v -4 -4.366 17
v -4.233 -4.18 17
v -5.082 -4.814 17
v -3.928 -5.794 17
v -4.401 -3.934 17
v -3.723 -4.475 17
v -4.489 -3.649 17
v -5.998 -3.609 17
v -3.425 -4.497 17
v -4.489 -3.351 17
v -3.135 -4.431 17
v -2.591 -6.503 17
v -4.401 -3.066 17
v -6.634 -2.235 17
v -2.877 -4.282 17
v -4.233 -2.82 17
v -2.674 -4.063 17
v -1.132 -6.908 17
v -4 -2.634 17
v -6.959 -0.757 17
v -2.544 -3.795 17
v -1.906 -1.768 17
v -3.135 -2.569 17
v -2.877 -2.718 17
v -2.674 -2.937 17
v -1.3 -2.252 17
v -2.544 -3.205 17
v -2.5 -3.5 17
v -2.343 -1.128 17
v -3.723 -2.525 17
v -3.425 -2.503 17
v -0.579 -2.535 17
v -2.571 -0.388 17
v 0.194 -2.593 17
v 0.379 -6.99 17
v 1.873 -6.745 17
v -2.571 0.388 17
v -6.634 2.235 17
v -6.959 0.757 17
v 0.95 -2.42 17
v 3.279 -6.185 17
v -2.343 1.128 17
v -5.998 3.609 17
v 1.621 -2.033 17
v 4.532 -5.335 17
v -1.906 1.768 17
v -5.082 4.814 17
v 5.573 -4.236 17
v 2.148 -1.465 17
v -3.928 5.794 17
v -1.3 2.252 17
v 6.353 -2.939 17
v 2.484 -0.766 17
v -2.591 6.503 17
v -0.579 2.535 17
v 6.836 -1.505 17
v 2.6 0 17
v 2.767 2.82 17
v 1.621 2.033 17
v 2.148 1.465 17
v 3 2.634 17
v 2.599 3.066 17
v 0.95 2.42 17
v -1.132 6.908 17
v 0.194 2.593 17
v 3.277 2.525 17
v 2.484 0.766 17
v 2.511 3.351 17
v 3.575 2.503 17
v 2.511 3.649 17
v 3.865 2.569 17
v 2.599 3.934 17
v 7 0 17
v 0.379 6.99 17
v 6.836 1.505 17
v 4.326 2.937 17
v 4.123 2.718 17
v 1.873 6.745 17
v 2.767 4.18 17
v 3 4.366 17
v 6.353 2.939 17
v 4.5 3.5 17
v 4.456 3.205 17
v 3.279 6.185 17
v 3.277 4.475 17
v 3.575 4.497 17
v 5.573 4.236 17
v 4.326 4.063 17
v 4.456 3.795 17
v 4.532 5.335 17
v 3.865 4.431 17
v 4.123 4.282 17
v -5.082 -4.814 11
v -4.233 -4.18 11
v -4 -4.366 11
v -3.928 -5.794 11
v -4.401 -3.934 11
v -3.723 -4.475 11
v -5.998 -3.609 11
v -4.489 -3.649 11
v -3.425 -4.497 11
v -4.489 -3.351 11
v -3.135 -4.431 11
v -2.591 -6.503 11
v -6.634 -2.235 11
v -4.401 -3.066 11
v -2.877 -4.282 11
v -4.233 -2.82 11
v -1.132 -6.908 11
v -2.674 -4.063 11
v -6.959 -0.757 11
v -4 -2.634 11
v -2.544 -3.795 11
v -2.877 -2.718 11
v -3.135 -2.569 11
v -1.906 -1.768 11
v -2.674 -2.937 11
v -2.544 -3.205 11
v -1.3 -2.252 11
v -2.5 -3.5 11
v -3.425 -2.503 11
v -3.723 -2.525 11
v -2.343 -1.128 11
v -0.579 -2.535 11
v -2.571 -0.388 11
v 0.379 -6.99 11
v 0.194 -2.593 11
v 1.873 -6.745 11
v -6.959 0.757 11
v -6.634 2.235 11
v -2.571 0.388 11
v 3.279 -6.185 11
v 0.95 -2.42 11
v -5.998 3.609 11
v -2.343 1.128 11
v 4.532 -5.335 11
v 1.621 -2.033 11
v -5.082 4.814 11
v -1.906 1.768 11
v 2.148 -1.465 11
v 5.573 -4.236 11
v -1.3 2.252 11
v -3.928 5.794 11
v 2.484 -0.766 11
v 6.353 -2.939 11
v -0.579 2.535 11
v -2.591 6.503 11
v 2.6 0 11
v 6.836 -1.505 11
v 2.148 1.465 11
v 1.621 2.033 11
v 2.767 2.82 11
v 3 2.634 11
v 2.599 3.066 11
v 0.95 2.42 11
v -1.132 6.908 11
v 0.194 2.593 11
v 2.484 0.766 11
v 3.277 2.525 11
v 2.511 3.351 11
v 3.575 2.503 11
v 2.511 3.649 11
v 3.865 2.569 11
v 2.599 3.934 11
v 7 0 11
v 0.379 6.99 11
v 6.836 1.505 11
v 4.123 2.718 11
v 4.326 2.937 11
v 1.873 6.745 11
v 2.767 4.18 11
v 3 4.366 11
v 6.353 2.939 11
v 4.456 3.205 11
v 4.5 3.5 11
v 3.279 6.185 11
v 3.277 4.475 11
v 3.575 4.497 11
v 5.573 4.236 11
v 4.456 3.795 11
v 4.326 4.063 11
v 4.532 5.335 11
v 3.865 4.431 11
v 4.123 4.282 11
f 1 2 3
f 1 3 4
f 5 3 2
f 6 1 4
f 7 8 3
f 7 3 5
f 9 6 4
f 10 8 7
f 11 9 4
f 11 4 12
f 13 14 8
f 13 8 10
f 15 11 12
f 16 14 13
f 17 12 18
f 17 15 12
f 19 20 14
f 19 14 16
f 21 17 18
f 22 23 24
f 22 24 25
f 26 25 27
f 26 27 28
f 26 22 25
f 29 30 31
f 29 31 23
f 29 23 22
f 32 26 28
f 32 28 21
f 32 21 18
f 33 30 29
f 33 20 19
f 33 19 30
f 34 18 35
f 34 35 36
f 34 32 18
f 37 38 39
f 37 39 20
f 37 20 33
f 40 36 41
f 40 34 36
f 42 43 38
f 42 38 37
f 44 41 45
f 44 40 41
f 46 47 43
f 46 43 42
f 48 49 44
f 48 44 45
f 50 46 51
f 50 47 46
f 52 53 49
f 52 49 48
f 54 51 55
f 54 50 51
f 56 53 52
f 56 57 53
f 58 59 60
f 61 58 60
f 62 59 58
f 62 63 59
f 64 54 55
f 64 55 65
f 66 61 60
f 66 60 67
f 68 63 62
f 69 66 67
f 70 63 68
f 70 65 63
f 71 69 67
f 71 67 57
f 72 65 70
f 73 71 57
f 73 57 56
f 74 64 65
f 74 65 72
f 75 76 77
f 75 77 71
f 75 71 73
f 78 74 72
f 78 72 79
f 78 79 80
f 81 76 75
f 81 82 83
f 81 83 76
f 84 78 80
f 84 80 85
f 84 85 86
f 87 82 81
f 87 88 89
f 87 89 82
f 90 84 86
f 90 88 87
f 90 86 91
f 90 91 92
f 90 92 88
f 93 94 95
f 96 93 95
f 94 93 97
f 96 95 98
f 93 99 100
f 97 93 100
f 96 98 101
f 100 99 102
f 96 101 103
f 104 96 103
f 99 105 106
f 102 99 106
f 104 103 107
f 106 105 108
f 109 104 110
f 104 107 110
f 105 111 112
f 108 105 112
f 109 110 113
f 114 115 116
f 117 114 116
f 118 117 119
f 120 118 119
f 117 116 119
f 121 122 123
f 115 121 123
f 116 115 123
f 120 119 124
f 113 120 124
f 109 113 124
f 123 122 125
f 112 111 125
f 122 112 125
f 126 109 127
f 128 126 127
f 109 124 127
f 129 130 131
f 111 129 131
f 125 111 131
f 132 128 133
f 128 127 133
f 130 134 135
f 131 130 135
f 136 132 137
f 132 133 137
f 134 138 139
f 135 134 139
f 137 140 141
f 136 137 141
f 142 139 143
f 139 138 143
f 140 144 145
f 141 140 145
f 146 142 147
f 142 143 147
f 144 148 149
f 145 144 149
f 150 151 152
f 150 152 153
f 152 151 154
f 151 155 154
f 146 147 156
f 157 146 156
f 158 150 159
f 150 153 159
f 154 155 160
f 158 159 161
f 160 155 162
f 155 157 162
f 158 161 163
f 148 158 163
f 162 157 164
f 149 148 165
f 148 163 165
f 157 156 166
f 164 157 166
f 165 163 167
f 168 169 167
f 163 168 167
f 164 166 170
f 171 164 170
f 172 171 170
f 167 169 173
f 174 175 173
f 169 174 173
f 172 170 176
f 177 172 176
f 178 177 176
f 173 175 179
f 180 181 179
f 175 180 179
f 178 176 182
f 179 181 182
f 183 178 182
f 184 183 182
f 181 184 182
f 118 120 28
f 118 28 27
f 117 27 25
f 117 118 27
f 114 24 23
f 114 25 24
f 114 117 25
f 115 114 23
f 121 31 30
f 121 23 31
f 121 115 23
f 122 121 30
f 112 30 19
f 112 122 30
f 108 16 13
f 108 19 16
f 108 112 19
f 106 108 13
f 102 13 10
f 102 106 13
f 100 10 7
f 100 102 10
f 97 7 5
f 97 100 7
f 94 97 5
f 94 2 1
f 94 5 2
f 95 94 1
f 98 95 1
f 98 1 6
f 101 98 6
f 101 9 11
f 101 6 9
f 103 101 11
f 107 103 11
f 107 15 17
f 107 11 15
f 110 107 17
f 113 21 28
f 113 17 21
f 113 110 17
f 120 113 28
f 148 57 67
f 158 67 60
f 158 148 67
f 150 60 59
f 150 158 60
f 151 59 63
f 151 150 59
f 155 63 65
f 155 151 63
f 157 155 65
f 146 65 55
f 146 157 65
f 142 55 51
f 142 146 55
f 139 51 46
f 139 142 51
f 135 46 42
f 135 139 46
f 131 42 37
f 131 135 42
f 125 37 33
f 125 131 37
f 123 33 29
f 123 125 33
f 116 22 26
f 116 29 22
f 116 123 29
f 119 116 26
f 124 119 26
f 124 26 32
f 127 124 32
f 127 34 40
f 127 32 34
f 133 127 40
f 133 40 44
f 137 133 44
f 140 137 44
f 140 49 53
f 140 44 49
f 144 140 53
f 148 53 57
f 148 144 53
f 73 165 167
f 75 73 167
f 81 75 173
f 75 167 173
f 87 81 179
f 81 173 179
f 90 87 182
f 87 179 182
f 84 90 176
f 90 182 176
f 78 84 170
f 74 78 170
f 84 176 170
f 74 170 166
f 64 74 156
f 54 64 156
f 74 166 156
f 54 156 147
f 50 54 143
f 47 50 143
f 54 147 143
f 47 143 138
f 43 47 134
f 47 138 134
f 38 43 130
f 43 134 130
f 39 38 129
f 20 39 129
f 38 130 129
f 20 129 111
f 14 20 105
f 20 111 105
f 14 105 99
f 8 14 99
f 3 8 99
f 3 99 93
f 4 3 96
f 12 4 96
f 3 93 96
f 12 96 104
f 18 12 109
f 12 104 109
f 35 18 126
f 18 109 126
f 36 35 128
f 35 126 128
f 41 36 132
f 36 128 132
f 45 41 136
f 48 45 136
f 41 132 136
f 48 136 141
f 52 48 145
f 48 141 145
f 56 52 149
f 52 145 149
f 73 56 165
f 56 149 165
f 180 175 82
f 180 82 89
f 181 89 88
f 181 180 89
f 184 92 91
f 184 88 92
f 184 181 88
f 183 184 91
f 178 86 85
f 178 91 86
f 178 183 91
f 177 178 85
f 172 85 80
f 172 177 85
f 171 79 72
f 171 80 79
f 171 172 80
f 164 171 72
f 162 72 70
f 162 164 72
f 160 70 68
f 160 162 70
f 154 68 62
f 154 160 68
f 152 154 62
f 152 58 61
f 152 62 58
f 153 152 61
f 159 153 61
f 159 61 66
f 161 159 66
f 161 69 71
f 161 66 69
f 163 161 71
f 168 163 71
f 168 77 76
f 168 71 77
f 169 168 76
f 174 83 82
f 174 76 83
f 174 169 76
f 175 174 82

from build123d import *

# Parameters (mm, degrees)
CYLINDER062_R     = 1
CYLINDER062_DEPTH = 20
CYLINDER063_R     = 1
CYLINDER063_DEPTH = 20
CYLINDER067_R     = 2.6
CYLINDER067_DEPTH = 12
CYLINDER068_R     = 7
CYLINDER068_DEPTH = 6


with BuildPart() as v_lec062:
    # Cylinder062 → Cylinder062 (new body)
    with BuildSketch(Plane(origin=(-3.5, -3.5, 0), x_dir=(1, 0, 0), z_dir=(0, 0, 1))):
        Circle(CYLINDER062_R)
    extrude(amount=CYLINDER062_DEPTH)


with BuildPart() as compound034:
    # Cylinder063 → Cylinder063 (new body)
    with BuildSketch(Plane(origin=(3.5, 3.5, 0), x_dir=(1, 0, 0), z_dir=(0, 0, 1))):
        Circle(CYLINDER063_R)
    extrude(amount=CYLINDER063_DEPTH)

    # Compound034: union Válec062
    add(v_lec062.part)


with BuildPart() as v_lec067:
    # Cylinder067 → Cylinder067 (new body)
    with BuildSketch(Plane.XY.offset(13)):
        Circle(CYLINDER067_R)
    extrude(amount=CYLINDER067_DEPTH)


with BuildPart() as cut037:
    # Cylinder068 → Cylinder068 (new body)
    with BuildSketch(Plane.XY.offset(13)):
        Circle(CYLINDER068_R)
    extrude(amount=CYLINDER068_DEPTH)

    # Cut036: cut Válec067
    add(v_lec067.part, mode=Mode.SUBTRACT)


with BuildPart() as cut037_1:
    # Cut036 placement: moved
    add(cut037.part.moved(Location((0, 0, -2))))

    # Cut037: cut Compound034
    add(compound034.part, mode=Mode.SUBTRACT)


solid = cut037_1.part
